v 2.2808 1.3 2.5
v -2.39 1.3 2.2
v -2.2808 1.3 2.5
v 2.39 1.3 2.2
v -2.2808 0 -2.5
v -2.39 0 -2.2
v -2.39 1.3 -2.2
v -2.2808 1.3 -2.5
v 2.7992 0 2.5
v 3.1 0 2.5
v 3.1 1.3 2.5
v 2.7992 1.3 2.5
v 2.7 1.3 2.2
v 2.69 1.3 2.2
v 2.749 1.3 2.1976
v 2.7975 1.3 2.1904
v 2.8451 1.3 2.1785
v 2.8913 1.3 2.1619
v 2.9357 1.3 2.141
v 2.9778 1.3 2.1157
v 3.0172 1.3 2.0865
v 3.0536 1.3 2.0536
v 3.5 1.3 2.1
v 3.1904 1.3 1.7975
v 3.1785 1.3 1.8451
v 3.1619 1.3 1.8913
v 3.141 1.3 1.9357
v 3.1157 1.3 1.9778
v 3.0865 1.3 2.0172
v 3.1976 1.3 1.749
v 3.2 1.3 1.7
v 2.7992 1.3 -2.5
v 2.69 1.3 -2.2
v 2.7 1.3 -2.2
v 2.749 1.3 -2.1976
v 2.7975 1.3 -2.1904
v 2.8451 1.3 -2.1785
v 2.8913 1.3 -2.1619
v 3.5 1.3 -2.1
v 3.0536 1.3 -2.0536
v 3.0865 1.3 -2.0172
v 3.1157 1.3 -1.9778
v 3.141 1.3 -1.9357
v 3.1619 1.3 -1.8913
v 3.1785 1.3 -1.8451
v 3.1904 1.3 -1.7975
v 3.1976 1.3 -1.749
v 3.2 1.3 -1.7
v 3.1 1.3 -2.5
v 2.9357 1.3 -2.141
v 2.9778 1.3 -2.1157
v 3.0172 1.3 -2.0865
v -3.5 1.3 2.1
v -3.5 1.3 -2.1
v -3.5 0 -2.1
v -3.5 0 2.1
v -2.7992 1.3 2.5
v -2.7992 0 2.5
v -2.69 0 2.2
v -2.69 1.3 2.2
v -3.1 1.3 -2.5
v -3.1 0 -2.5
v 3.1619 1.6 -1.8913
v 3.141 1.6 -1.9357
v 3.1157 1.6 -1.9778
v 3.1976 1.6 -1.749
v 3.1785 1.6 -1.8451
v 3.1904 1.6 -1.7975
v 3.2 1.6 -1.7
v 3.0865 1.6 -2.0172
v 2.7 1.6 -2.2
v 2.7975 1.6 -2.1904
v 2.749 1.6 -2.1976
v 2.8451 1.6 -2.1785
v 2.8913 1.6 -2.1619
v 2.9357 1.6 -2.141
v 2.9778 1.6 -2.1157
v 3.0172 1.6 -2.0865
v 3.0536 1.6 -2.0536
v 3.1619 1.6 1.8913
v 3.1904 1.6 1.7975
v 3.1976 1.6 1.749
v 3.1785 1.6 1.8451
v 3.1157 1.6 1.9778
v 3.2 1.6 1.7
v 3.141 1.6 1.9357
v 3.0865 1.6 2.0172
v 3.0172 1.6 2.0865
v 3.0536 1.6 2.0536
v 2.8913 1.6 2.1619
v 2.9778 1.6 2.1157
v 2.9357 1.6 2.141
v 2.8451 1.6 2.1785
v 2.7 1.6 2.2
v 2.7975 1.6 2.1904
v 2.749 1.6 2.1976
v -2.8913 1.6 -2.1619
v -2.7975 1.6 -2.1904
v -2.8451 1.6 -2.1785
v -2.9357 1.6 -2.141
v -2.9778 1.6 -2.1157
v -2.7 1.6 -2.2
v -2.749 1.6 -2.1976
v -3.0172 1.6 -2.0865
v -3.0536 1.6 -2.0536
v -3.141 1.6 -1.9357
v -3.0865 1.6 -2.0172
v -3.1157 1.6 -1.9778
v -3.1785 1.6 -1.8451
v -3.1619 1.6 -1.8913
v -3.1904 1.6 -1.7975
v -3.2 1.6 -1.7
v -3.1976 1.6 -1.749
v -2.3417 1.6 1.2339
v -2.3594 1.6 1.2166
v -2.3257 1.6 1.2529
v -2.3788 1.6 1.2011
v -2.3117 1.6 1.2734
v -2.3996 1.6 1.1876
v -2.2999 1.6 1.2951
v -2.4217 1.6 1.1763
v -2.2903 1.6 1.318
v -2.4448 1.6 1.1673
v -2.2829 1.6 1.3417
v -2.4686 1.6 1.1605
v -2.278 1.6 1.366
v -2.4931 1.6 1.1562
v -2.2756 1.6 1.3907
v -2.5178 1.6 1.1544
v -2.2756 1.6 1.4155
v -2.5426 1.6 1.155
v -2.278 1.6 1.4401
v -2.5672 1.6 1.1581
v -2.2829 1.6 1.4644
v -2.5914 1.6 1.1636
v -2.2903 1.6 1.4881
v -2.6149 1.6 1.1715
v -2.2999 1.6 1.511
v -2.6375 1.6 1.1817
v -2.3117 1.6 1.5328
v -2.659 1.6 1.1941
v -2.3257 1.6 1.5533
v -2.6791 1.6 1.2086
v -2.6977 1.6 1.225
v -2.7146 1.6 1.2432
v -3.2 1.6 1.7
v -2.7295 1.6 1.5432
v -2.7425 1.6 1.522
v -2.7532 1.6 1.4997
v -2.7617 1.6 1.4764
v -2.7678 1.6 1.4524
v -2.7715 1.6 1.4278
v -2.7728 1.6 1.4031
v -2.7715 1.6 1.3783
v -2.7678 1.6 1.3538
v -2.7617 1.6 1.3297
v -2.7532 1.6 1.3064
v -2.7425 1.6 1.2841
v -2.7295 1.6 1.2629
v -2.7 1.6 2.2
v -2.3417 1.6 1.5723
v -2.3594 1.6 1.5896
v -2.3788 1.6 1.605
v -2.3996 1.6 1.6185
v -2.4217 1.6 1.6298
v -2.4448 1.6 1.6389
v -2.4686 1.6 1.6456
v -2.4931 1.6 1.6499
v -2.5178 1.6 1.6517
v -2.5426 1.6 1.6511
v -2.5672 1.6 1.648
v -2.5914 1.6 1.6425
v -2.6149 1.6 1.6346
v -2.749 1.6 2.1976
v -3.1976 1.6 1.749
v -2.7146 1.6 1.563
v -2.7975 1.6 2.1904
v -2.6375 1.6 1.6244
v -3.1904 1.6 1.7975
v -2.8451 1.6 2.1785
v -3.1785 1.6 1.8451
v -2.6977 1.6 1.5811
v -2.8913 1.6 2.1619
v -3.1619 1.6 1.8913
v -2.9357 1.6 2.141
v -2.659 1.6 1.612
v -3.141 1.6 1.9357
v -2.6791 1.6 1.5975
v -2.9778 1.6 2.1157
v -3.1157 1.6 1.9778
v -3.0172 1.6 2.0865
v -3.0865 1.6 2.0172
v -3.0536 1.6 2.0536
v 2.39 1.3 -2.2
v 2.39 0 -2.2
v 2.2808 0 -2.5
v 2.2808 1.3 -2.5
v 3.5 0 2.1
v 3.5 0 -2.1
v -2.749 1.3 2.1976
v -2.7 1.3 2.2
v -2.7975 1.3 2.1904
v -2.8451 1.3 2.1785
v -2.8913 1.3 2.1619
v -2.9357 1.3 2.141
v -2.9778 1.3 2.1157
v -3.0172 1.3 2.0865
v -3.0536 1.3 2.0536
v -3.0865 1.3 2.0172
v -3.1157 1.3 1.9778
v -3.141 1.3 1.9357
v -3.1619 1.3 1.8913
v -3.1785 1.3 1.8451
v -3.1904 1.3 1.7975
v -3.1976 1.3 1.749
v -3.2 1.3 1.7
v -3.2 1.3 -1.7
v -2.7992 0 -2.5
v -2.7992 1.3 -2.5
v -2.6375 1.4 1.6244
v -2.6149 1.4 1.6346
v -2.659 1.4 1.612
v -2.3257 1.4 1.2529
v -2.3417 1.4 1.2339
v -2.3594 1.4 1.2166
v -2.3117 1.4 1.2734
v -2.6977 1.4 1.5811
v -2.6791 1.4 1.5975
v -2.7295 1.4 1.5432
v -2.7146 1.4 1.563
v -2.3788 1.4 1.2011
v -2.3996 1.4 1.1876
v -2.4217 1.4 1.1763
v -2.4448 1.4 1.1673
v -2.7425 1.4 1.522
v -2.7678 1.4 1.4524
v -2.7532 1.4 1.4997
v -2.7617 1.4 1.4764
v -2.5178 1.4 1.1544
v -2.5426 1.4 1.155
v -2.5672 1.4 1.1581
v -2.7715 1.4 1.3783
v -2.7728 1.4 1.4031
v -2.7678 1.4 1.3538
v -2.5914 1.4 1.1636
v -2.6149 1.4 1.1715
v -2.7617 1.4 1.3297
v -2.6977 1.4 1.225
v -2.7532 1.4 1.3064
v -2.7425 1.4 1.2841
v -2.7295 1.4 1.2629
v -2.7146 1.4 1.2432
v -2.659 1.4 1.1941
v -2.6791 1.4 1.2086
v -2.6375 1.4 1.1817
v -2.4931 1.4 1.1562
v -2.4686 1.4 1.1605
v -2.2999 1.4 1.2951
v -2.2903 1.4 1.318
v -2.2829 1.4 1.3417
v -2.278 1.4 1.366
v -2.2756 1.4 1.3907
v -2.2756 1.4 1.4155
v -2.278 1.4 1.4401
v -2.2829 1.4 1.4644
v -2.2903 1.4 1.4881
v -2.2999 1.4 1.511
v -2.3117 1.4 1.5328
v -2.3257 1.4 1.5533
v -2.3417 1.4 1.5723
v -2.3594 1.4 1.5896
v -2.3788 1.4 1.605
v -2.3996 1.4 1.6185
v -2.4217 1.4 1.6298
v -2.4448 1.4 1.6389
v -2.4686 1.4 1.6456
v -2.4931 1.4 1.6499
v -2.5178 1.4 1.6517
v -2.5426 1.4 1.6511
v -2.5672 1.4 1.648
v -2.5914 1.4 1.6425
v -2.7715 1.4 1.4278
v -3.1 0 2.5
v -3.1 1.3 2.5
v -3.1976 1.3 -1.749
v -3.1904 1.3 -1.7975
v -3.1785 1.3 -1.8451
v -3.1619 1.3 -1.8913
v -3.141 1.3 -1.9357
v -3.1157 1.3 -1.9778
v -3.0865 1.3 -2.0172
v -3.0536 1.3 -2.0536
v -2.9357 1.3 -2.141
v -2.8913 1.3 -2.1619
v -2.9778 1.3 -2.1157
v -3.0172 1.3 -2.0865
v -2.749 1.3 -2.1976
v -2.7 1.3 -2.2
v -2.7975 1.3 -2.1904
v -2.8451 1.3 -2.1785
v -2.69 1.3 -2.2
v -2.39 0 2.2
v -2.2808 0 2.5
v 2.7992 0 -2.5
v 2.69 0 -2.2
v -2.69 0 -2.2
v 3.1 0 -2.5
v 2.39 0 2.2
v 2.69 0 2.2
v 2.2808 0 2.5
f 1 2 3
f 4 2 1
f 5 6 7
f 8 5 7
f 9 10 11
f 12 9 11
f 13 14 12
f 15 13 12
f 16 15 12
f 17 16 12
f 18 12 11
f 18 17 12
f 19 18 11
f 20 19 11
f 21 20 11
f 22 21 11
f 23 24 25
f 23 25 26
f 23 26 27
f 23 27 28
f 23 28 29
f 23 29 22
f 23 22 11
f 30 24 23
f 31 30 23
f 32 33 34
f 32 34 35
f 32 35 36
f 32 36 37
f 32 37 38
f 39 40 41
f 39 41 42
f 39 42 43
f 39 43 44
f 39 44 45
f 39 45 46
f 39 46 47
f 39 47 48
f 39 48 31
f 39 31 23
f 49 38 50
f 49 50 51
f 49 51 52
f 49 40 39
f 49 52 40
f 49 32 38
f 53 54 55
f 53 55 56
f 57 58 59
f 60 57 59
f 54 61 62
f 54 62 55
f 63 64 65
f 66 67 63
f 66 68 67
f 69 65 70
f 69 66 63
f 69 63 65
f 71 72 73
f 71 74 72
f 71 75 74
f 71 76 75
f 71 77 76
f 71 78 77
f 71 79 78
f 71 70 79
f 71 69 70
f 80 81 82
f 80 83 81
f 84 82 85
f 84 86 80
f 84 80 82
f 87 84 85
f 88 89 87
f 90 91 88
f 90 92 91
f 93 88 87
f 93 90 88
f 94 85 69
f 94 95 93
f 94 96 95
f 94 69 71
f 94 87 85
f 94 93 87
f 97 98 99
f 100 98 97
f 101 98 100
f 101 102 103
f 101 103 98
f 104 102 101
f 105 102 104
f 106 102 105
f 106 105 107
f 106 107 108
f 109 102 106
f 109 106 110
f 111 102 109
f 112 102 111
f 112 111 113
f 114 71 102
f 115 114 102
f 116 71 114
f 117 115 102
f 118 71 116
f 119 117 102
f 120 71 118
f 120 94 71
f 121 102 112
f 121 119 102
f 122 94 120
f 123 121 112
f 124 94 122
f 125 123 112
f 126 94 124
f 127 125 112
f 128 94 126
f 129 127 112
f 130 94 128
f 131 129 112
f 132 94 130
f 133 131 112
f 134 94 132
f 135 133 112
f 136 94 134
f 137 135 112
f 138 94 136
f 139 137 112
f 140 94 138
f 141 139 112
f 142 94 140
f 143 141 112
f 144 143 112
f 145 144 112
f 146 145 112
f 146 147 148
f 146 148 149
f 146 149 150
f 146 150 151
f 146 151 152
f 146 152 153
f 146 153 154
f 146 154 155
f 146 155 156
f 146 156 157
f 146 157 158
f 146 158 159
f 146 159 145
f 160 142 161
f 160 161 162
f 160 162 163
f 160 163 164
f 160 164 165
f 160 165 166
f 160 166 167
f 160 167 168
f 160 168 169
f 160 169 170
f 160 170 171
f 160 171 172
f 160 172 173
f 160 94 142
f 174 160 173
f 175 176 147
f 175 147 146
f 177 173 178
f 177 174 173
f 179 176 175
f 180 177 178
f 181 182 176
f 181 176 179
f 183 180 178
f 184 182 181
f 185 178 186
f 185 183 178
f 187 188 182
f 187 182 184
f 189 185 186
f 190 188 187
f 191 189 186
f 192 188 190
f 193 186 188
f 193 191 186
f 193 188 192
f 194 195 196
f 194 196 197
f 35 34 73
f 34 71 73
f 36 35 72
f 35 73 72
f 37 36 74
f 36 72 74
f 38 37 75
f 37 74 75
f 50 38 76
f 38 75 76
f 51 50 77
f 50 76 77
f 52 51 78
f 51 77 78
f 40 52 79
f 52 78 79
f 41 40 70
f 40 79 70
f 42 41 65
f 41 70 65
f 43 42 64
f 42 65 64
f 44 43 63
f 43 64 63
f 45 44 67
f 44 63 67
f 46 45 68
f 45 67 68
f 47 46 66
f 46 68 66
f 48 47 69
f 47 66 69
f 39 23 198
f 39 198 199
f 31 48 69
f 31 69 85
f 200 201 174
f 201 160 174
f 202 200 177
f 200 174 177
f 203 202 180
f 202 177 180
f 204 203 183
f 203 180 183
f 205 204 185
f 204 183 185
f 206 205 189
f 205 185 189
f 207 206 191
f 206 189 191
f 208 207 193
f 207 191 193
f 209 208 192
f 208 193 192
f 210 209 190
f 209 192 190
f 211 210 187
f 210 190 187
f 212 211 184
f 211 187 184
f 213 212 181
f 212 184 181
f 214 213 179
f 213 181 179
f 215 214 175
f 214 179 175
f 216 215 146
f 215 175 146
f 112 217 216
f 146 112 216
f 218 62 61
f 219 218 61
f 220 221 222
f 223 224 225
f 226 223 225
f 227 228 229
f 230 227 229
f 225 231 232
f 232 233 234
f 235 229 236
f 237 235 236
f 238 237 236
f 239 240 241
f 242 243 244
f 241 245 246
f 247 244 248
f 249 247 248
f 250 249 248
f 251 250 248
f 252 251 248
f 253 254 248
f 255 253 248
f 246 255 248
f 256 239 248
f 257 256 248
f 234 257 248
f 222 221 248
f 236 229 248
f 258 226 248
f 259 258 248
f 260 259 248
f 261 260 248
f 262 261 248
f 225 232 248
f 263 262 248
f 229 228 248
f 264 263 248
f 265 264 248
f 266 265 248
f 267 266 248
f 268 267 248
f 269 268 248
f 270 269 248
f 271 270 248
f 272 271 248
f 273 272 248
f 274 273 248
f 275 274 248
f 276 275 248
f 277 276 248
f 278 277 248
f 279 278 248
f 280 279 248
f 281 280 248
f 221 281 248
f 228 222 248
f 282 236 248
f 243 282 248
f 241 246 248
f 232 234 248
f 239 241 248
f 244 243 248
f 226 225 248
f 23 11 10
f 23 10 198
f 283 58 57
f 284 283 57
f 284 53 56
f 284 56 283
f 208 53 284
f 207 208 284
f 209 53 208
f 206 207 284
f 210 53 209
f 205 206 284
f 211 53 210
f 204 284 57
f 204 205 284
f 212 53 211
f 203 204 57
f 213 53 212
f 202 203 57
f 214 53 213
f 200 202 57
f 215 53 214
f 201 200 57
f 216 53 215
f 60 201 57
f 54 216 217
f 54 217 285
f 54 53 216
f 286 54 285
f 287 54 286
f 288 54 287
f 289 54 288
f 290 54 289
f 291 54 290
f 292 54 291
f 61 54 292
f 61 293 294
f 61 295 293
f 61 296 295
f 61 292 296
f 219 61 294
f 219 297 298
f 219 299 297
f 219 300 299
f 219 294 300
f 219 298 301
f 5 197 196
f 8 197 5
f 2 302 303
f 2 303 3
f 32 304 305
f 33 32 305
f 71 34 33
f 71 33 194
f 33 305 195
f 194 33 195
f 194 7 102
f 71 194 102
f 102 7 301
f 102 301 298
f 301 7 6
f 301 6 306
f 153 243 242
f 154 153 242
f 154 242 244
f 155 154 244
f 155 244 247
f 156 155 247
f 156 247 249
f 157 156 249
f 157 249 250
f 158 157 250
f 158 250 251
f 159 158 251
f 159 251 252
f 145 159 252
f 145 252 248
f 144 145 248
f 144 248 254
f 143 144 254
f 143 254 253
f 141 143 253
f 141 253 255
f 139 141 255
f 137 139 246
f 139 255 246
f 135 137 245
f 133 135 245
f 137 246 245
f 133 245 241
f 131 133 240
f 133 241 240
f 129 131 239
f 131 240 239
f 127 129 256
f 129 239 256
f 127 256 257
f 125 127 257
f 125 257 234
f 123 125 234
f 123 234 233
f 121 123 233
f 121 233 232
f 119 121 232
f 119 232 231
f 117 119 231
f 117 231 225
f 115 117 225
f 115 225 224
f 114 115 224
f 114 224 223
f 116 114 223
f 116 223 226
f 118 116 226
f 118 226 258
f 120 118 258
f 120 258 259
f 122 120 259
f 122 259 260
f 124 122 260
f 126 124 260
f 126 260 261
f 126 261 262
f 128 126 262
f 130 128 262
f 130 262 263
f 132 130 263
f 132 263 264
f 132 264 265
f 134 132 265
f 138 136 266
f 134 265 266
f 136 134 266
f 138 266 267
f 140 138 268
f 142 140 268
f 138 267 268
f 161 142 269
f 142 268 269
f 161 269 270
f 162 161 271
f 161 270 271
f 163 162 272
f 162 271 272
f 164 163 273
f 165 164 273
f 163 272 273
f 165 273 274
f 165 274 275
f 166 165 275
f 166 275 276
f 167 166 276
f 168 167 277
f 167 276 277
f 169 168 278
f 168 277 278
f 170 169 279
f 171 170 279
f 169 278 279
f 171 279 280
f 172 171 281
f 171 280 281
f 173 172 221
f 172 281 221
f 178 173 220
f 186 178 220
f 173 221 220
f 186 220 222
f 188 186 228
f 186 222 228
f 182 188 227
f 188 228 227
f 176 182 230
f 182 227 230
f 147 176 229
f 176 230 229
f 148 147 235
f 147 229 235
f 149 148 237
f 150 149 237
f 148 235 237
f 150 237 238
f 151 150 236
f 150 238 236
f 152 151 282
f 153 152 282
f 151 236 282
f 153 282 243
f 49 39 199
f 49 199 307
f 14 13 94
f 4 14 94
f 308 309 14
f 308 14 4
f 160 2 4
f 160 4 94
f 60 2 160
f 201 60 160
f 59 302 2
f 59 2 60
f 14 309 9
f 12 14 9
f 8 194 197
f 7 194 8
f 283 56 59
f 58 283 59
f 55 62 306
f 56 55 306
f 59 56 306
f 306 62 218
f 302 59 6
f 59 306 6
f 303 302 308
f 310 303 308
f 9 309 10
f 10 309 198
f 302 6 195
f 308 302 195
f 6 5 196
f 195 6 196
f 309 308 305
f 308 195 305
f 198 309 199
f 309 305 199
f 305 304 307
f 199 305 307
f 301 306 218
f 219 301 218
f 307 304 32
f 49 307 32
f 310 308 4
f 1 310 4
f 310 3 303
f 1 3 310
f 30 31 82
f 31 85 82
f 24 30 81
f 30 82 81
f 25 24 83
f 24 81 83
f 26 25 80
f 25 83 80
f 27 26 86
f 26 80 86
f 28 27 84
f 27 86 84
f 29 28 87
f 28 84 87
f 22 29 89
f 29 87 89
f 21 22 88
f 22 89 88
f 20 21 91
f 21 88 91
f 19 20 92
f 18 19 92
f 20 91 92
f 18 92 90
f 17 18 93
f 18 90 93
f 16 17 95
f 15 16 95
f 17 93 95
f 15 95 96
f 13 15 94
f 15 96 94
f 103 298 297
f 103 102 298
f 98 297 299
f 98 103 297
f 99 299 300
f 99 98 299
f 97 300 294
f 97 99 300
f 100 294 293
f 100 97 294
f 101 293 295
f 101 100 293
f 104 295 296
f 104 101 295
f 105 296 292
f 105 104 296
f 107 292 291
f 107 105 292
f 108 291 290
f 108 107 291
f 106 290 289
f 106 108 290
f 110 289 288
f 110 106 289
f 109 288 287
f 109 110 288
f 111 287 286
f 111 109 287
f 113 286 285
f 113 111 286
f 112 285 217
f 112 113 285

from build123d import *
from OCP.BRepFilletAPI import BRepFilletAPI_MakeChamfer

# Parameters (mm, degrees)
BOSS_EXTRUDE1_DEPTH = 1.3
CUT_EXTRUDE1_DEPTH  = 7.730527468
CUT_EXTRUDE2_DEPTH  = 7.730527468
SKETCH4_W           = 6.4
SKETCH4_H           = 4.4
BOSS_EXTRUDE2_DEPTH = 0.3
SKETCH5_W           = 4.78
SKETCH5_H           = 1.3
BOSS_EXTRUDE3_DEPTH = 0.3
SKETCH6_W           = 4.78
SKETCH6_H           = 1.3
BOSS_EXTRUDE4_DEPTH = 0.3
DRAFT1_ANGLE        = 20
DRAFT2_ANGLE        = 20
HOLE1_D             = 0.497503641
HOLE1_DEPTH         = 0.2
CHAMFER1_SIZE       = 0.234692934
CHAMFER1_SIZE2      = 0.311889554
CHAMFER2_SIZE       = 0.311889554
CHAMFER2_SIZE2      = 0.234692934
FILLET1_R           = 0.5


with BuildPart() as part:
    # Sketch1 → Boss-Extrude1 (new body)
    with BuildSketch(Plane(origin=(0, 1.3, 0), x_dir=(1, 0, 0), z_dir=(0, 1, 0))):
        Polygon((3.5, 2.1), (0, 5.6), (-3.5, 2.1), (-3.5, -2.1), (0, -5.6), (3.5, -2.1), align=None)
    extrude(amount=-BOSS_EXTRUDE1_DEPTH)

    # Sketch2 → Cut-Extrude1 (cut, through all)
    with BuildSketch(Plane.XZ):
        Polygon((0, -5.6), (2.69, -2.91), (2.69, -2.2), (-2.69, -2.2), (-2.69, -2.91), align=None)
    extrude(amount=-CUT_EXTRUDE1_DEPTH, mode=Mode.SUBTRACT)

    # Sketch3 → Cut-Extrude2 (cut, through all)
    with BuildSketch(Plane.XZ):
        Polygon((2.69, 2.2), (2.69, 2.91), (0, 5.6), (-2.69, 2.91), (-2.69, 2.2), align=None)
    extrude(amount=-CUT_EXTRUDE2_DEPTH, mode=Mode.SUBTRACT)

    # Sketch4 → Boss-Extrude2 (add)
    with BuildSketch(Plane(origin=(0, 1.3, 0), x_dir=(-1, 0, 0), z_dir=(0, 1, 0))):
        Rectangle(SKETCH4_W, SKETCH4_H)
    extrude(amount=BOSS_EXTRUDE2_DEPTH)

    # Sketch5 → Boss-Extrude3 (add)
    with BuildSketch(Plane.XY.offset(2.2)):
        with Locations((0, 0.65)):
            Rectangle(SKETCH5_W, SKETCH5_H)
    extrude(amount=BOSS_EXTRUDE3_DEPTH)

    # Sketch6 → Boss-Extrude4 (add)
    with BuildSketch(Plane(origin=(0, 0, -2.2), x_dir=(-1, 0, 0), z_dir=(0, 0, -1))):
        with Locations((0, 0.65)):
            Rectangle(SKETCH6_W, SKETCH6_H)
    extrude(amount=BOSS_EXTRUDE4_DEPTH)

    # Draft1
    draft1_faces = [part.faces().sort_by_distance(p)[0] for p in [
        (-2.69, 0.65, -2.555),
        (-2.39, 0.65, -2.35),
        (2.39, 0.65, -2.35),
        (2.69, 0.65, -2.555),
    ]]
    draft(draft1_faces, Plane(origin=(2.69, 1.3, -2.2), x_dir=(-1, 0, 0), z_dir=(0, 0, -1)), DRAFT1_ANGLE)

    # Draft2
    draft2_faces = [part.faces().sort_by_distance(p)[0] for p in [
        (2.69, 0.65, 2.555),
        (2.39, 0.65, 2.35),
        (-2.39, 0.65, 2.35),
        (-2.69, 0.65, 2.555),
    ]]
    draft(draft2_faces, Plane(origin=(-2.69, 1.3, 2.2), x_dir=(1, 0, 0), z_dir=(0, 0, 1)), DRAFT2_ANGLE)

    # Hole1
    with Locations(Plane(origin=(0, 1.6, 0), x_dir=(1, 0, 0), z_dir=(0, 1, 0))):
        with Locations((-2.524000409, -1.40306368)):
            Hole(HOLE1_D / 2, depth=HOLE1_DEPTH)

    # Chamfer1: one chamfer whose edges measure the first distance from different faces: ONE call of the kernel's chamfer builder (chamfer() names one face for all edges)
    chamfer1_edges_1 = [part.edges().sort_by_distance(p)[0] for p in [
        (-2.879460781, 0.65, -2.720539219),
    ]]
    chamfer1_side_1 = [part.faces().sort_by_distance(p)[0] for p in [
        (-2.784730391, 0.65, -2.460269609),
    ]]
    chamfer1_edges_2 = [part.edges().sort_by_distance(p)[0] for p in [
        (2.879460781, 0.65, 2.720539219),
    ]]
    chamfer1_side_2 = [part.faces().sort_by_distance(p)[0] for p in [
        (2.784730391, 0.65, 2.460269609),
    ]]
    chamfer1 = BRepFilletAPI_MakeChamfer(part.part.solid().wrapped)
    for e in chamfer1_edges_1:
        chamfer1.Add(CHAMFER1_SIZE, CHAMFER1_SIZE2, e.wrapped, chamfer1_side_1[0].wrapped)  # the first distance lies on this face
    for e in chamfer1_edges_2:
        chamfer1.Add(CHAMFER1_SIZE, CHAMFER1_SIZE2, e.wrapped, chamfer1_side_2[0].wrapped)  # the first distance lies on this face
    add(Compound.cast(chamfer1.Shape()), mode=Mode.REPLACE)

    # Chamfer2: one chamfer whose edges measure the first distance from different faces: ONE call of the kernel's chamfer builder (chamfer() names one face for all edges)
    chamfer2_edges_1 = [part.edges().sort_by_distance(p)[0] for p in [
        (2.879460781, 0.65, -2.720539219),
    ]]
    chamfer2_side_1 = [part.faces().sort_by_distance(p)[0] for p in [
        (3.189730391, 0.65, -2.410269609),
    ]]
    chamfer2_edges_2 = [part.edges().sort_by_distance(p)[0] for p in [
        (-2.879460781, 0.65, 2.720539219),
    ]]
    chamfer2_side_2 = [part.faces().sort_by_distance(p)[0] for p in [
        (-3.189730391, 0.65, 2.410269609),
    ]]
    chamfer2 = BRepFilletAPI_MakeChamfer(part.part.solid().wrapped)
    for e in chamfer2_edges_1:
        chamfer2.Add(CHAMFER2_SIZE, CHAMFER2_SIZE2, e.wrapped, chamfer2_side_1[0].wrapped)  # the first distance lies on this face
    for e in chamfer2_edges_2:
        chamfer2.Add(CHAMFER2_SIZE, CHAMFER2_SIZE2, e.wrapped, chamfer2_side_2[0].wrapped)  # the first distance lies on this face
    add(Compound.cast(chamfer2.Shape()), mode=Mode.REPLACE)

    # Fillet1
    fillet1_edges = [part.edges().sort_by_distance(p)[0] for p in [
        (3.2, 1.45, -2.2),
        (-3.2, 1.45, -2.2),
        (-3.2, 1.45, 2.2),
        (3.2, 1.45, 2.2),
    ]]
    fillet(fillet1_edges, radius=FILLET1_R)


solid = part.part
